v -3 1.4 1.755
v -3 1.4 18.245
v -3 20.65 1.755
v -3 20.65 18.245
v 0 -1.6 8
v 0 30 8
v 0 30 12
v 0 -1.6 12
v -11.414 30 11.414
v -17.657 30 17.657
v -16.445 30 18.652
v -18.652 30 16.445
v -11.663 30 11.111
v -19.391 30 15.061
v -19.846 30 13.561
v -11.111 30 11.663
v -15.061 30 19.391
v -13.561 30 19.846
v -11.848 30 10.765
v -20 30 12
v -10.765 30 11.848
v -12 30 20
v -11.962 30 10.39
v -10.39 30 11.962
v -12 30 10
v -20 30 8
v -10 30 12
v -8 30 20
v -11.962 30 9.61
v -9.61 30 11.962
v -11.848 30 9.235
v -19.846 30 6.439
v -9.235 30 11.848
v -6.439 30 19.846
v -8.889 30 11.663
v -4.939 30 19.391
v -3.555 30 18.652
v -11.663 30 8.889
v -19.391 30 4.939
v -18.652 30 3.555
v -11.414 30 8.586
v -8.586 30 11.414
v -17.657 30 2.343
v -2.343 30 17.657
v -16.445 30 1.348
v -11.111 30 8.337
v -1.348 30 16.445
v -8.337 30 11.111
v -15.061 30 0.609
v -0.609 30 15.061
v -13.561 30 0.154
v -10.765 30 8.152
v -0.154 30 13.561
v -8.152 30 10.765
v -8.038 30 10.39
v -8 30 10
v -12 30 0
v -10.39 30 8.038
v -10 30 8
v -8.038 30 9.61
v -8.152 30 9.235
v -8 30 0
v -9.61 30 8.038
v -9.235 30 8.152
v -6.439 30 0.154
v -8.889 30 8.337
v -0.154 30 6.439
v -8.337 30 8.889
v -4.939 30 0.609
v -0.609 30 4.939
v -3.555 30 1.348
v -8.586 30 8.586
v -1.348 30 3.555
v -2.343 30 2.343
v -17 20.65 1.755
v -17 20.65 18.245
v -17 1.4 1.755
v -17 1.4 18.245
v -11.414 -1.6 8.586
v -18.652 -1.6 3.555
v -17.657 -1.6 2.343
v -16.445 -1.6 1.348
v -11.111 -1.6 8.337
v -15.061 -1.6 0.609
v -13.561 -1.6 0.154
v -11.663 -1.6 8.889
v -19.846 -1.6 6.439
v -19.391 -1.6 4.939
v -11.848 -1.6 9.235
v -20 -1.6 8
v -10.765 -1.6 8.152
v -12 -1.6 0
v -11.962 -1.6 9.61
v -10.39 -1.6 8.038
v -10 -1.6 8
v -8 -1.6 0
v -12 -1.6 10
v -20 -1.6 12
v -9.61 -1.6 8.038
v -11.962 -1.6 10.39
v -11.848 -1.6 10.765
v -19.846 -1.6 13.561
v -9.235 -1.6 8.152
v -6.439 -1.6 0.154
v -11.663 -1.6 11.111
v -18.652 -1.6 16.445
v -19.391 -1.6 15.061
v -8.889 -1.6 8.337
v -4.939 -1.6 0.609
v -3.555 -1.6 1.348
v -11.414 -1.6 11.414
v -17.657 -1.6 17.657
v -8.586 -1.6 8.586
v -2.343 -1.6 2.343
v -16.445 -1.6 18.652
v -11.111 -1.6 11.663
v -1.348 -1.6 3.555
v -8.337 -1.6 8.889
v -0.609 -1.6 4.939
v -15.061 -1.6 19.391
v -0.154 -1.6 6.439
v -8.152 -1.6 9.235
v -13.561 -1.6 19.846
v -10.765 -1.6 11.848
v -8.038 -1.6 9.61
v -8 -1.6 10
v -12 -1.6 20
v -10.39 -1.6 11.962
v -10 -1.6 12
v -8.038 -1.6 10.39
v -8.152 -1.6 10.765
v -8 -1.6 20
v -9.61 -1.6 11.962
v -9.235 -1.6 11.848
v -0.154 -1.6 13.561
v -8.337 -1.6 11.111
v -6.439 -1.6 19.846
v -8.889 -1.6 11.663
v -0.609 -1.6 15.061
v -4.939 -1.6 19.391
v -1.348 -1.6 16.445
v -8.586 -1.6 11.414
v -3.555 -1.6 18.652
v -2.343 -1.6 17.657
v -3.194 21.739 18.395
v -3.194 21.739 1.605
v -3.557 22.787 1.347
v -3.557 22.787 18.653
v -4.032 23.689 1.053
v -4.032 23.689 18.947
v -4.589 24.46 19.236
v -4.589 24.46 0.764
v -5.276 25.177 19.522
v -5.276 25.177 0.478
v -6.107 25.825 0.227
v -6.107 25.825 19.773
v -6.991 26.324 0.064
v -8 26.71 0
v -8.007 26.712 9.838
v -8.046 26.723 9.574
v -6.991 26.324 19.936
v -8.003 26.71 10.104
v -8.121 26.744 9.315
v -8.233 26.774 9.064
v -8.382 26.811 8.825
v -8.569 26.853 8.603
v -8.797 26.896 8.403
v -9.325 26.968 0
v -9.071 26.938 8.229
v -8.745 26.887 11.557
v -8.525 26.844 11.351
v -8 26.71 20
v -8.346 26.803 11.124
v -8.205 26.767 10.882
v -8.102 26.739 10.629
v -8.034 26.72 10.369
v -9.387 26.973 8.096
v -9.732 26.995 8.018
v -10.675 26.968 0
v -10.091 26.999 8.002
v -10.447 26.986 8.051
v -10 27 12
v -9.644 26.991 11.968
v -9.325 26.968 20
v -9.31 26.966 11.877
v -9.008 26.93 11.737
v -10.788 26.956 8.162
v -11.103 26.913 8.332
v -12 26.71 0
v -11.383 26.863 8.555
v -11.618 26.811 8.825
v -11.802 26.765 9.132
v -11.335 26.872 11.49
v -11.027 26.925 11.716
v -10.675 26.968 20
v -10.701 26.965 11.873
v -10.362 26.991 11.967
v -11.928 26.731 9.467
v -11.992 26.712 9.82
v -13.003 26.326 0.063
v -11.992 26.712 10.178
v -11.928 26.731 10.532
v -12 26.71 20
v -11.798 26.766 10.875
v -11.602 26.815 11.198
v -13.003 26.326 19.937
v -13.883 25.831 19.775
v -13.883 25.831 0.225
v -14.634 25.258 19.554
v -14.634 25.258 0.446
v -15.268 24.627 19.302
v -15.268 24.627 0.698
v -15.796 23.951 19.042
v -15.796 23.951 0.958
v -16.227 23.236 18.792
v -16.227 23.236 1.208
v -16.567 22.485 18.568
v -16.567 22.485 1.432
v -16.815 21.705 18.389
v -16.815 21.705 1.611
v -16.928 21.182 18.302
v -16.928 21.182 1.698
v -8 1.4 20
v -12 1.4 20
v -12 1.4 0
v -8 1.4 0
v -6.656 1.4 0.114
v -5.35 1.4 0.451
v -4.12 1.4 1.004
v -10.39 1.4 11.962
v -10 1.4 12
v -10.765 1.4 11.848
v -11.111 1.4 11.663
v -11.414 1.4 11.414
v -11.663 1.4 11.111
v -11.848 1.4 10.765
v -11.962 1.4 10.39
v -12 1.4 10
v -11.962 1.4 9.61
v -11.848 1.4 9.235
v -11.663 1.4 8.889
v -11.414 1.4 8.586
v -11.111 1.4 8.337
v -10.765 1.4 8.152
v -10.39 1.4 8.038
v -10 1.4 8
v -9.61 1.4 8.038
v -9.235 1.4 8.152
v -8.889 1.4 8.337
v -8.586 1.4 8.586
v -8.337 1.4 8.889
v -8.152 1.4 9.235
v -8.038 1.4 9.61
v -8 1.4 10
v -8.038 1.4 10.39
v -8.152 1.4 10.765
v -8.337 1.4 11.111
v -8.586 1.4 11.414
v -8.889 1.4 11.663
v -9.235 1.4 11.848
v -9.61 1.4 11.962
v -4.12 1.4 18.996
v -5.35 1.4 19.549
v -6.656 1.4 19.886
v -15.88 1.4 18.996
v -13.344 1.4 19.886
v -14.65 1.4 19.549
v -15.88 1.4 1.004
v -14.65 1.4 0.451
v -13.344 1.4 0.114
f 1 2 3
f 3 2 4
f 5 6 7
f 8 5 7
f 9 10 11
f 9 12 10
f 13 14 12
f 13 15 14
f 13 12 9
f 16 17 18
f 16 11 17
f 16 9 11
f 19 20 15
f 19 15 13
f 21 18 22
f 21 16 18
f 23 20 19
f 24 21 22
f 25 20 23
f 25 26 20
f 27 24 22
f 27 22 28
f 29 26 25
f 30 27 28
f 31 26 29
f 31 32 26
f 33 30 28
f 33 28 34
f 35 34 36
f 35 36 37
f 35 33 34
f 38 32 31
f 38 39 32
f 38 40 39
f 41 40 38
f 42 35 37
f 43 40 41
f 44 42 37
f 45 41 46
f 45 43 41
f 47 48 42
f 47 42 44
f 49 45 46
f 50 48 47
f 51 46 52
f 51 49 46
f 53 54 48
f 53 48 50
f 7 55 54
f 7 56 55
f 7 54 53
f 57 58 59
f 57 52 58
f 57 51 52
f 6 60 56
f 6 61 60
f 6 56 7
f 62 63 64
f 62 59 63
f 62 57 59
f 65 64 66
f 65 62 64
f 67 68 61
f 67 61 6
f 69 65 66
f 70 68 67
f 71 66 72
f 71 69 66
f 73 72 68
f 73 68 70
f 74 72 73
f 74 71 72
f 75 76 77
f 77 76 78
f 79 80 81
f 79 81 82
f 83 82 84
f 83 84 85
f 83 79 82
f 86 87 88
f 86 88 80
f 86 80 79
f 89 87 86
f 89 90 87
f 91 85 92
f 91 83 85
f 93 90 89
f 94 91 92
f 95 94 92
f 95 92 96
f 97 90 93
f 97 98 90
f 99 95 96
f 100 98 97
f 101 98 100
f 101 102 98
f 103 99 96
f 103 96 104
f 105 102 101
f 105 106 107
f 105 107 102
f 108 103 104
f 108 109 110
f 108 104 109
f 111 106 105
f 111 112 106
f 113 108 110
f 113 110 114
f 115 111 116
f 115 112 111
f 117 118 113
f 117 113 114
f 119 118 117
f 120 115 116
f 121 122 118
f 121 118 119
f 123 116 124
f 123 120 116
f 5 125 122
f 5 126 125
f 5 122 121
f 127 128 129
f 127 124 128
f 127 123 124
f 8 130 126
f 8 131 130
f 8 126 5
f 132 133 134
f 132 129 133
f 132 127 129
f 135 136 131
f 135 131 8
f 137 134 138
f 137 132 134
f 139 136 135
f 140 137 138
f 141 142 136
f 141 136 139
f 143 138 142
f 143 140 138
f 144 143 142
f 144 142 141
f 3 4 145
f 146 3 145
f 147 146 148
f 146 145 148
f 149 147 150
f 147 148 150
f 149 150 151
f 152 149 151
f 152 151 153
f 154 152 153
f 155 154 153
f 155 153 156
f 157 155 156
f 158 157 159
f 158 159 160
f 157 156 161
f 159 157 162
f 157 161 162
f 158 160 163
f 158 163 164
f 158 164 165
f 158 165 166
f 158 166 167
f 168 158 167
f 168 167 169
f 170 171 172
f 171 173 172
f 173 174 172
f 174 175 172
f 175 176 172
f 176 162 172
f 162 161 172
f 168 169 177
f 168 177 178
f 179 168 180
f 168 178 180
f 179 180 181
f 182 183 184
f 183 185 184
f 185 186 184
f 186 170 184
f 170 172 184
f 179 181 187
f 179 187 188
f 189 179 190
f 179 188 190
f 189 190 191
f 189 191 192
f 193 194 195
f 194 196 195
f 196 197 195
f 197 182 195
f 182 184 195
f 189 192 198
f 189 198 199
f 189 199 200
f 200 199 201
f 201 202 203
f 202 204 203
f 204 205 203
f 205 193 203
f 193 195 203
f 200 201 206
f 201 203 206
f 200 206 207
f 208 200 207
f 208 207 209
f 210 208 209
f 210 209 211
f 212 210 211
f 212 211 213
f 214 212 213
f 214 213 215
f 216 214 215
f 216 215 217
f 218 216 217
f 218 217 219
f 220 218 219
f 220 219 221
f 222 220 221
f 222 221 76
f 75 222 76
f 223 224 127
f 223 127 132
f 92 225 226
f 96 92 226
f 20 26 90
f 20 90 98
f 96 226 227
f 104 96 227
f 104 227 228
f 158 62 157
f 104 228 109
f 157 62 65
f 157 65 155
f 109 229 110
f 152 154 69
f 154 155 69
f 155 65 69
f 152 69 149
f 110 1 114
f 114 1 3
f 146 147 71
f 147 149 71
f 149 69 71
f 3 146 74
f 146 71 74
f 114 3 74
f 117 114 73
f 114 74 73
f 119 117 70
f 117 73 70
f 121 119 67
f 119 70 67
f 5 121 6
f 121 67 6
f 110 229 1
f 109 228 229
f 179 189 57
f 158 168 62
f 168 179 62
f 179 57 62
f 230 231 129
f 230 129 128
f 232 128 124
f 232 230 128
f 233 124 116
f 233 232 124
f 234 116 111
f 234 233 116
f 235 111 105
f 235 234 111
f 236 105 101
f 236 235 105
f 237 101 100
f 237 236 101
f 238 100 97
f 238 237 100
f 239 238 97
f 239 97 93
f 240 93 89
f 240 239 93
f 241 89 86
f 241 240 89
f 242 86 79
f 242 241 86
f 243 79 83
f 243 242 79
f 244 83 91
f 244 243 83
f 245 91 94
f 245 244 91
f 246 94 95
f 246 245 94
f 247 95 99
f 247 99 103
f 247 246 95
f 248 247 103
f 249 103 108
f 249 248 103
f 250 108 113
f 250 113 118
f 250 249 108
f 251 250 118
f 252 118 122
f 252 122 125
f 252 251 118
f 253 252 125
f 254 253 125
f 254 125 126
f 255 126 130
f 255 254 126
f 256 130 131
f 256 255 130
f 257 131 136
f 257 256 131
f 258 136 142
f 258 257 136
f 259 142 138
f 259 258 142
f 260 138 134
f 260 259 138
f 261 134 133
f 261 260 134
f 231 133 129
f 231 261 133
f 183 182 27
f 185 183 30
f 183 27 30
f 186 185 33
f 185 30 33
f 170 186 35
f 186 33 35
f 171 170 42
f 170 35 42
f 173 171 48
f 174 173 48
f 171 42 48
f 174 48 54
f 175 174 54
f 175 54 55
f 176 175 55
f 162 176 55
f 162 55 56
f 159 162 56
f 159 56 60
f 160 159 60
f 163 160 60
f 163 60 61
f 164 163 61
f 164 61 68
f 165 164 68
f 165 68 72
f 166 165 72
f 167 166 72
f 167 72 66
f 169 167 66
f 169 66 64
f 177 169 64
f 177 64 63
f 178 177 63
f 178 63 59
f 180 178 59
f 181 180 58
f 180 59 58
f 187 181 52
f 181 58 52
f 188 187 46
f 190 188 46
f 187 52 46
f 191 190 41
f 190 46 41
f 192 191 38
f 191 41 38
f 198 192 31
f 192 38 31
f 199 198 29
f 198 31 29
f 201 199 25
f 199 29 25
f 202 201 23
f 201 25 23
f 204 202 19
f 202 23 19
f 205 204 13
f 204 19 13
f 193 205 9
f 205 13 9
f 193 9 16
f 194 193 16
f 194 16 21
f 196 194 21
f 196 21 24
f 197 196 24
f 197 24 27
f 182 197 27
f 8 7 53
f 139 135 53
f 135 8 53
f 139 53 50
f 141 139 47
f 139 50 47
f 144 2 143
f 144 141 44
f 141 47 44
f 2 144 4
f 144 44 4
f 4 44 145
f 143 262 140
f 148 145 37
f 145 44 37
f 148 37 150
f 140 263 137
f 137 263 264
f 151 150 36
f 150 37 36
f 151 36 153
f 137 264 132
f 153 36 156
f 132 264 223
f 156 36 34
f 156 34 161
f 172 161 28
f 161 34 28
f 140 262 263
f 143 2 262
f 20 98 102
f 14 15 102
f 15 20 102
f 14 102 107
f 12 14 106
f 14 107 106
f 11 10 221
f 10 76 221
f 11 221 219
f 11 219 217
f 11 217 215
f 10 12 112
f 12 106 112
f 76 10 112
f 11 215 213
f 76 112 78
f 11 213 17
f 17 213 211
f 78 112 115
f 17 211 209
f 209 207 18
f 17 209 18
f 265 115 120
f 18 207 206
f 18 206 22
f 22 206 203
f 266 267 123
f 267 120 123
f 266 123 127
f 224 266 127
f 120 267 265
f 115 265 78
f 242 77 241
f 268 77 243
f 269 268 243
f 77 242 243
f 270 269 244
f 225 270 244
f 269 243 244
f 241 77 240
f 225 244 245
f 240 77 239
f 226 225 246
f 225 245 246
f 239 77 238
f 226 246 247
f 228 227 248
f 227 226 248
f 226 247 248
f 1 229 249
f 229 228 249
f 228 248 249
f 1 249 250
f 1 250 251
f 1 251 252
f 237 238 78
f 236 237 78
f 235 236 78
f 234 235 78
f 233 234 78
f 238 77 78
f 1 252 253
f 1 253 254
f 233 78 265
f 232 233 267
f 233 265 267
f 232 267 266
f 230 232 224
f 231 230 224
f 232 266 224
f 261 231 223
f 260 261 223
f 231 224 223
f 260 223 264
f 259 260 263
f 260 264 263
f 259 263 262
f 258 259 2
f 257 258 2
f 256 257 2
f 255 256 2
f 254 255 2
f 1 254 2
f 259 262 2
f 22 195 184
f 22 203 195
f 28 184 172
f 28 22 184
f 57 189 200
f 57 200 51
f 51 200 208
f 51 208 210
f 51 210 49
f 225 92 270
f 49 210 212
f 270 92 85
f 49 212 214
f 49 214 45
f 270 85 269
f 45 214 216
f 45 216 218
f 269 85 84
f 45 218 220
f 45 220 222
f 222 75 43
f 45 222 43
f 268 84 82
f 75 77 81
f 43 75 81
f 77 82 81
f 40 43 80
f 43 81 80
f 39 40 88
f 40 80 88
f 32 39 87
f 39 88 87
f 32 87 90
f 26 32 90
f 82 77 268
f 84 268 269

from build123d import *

# Parameters (mm, degrees)
CROQUIS1_W              = 20
CROQUIS1_H              = 20
SALIENTE_EXTRUIR1_DEPTH = 30
CROQUIS3_R              = 6.35
CORTAR_EXTRUIR1_DEPTH   = 18
CORTAR_EXTRUIR2_REACH   = 43.231
CROQUIS4_R              = 2
CROQUIS7_W              = 20
CROQUIS7_H              = 20
CROQUIS7_R              = 2
SALIENTE_EXTRUIR3_DEPTH = 1.6
CORTAR_EXTRUIR3_REACH   = 43.231
REDONDEO1_R             = 8


with BuildPart() as part:
    # Croquis1 → Saliente-Extruir1 (new body)
    with BuildSketch(Plane(origin=(0, 0, 0), x_dir=(1, 0, 0), z_dir=(0, 1, 0))):
        with Locations((-10, -10)):
            Rectangle(CROQUIS1_W, CROQUIS1_H)
    extrude(amount=SALIENTE_EXTRUIR1_DEPTH)

    # Croquis3 → Cortar-Extruir1 (cut)
    with BuildSketch(Plane.XY.offset(20)):
        with Locations((-10, 13.75)):
            Circle(CROQUIS3_R)
    extrude(amount=-CORTAR_EXTRUIR1_DEPTH, mode=Mode.SUBTRACT)

    # Cortar-Extruir2: up to this face of the body (flat: up to its plane)
    cortar_extruir2_end = Plane(part.part.faces().sort_by_distance((-10, 0, 10))[0])
    # Croquis4 → Cortar-Extruir2 (cut, up to the picked face)
    with BuildSketch(Plane(origin=(0, 30, 0), x_dir=(1, 0, 0), z_dir=(0, 1, 0)), mode=Mode.PRIVATE) as cortar_extruir2_sk1:
        with Locations(Location((-10, -10, 0), (0, 0, 270))):
            Circle(CROQUIS4_R)
    cortar_extruir2_tool1 = split(extrude(cortar_extruir2_sk1.sketch, amount=-CORTAR_EXTRUIR2_REACH, mode=Mode.PRIVATE), bisect_by=cortar_extruir2_end, keep=Keep.BOTH, mode=Mode.PRIVATE)
    add(cortar_extruir2_tool1.solids().sort_by(Axis((-10, 30, 10), (0, -1, 0)))[0], mode=Mode.SUBTRACT)

    # Croquis7 → Saliente-Extruir3 (add)
    with BuildSketch(Plane.XZ):
        with Locations((-10, 10)):
            Rectangle(CROQUIS7_W, CROQUIS7_H)
        with Locations(Location((-10, 10, 0), (0, 0, 90))):
            Circle(CROQUIS7_R, mode=Mode.SUBTRACT)
    extrude(amount=SALIENTE_EXTRUIR3_DEPTH)

    # Croquis8 → Cortar-Extruir3 (cut, up to next)
    with BuildSketch(Plane.XY.offset(20), mode=Mode.PRIVATE) as cortar_extruir3_sk1:
        with BuildLine():
            Line((-17, 7.75), (-17, 1.4))
            Line((-17, 1.4), (-3, 1.4))
            Line((-3, 1.4), (-3, 7.75))
            Line((-3, 7.75), (-3, 20.65))
            ThreePointArc((-3, 20.65), (-10, 27), (-17, 20.65))
            Line((-17, 20.65), (-17, 7.75))
        make_face()
    cortar_extruir3_tool1 = extrude(cortar_extruir3_sk1.sketch, amount=-CORTAR_EXTRUIR3_REACH, mode=Mode.PRIVATE) & part.part
    add(cortar_extruir3_tool1.solids().sort_by_distance((-10, 13.506159, 20))[0], mode=Mode.SUBTRACT)

    # Redondeo1
    # the kernel refuses this fillet: 8 mm, written as the material it takes off along each edge
    with BuildSketch(Plane(origin=(-20, -21.6, 0), x_dir=(1, 0, 0), z_dir=(0, 1, 0)), Plane(origin=(0, 50, 0), x_dir=(-1, 0, 0), z_dir=(0, -1, 0)), Plane(origin=(-20, -21.6, 20), x_dir=(0, 0, -1), z_dir=(0, 1, 0)), Plane(origin=(0, 50, 20), x_dir=(0, 0, -1), z_dir=(0, -1, 0))) as redondeo1_piece_1:
        with BuildLine():
            CenterArc((REDONDEO1_R, -REDONDEO1_R), REDONDEO1_R, 90, 90)
            Line((0, -REDONDEO1_R), (0, 0))
            Line((0, 0), (REDONDEO1_R, 0))
        make_face()
    extrude(amount=71.6, mode=Mode.SUBTRACT)


solid = part.part
